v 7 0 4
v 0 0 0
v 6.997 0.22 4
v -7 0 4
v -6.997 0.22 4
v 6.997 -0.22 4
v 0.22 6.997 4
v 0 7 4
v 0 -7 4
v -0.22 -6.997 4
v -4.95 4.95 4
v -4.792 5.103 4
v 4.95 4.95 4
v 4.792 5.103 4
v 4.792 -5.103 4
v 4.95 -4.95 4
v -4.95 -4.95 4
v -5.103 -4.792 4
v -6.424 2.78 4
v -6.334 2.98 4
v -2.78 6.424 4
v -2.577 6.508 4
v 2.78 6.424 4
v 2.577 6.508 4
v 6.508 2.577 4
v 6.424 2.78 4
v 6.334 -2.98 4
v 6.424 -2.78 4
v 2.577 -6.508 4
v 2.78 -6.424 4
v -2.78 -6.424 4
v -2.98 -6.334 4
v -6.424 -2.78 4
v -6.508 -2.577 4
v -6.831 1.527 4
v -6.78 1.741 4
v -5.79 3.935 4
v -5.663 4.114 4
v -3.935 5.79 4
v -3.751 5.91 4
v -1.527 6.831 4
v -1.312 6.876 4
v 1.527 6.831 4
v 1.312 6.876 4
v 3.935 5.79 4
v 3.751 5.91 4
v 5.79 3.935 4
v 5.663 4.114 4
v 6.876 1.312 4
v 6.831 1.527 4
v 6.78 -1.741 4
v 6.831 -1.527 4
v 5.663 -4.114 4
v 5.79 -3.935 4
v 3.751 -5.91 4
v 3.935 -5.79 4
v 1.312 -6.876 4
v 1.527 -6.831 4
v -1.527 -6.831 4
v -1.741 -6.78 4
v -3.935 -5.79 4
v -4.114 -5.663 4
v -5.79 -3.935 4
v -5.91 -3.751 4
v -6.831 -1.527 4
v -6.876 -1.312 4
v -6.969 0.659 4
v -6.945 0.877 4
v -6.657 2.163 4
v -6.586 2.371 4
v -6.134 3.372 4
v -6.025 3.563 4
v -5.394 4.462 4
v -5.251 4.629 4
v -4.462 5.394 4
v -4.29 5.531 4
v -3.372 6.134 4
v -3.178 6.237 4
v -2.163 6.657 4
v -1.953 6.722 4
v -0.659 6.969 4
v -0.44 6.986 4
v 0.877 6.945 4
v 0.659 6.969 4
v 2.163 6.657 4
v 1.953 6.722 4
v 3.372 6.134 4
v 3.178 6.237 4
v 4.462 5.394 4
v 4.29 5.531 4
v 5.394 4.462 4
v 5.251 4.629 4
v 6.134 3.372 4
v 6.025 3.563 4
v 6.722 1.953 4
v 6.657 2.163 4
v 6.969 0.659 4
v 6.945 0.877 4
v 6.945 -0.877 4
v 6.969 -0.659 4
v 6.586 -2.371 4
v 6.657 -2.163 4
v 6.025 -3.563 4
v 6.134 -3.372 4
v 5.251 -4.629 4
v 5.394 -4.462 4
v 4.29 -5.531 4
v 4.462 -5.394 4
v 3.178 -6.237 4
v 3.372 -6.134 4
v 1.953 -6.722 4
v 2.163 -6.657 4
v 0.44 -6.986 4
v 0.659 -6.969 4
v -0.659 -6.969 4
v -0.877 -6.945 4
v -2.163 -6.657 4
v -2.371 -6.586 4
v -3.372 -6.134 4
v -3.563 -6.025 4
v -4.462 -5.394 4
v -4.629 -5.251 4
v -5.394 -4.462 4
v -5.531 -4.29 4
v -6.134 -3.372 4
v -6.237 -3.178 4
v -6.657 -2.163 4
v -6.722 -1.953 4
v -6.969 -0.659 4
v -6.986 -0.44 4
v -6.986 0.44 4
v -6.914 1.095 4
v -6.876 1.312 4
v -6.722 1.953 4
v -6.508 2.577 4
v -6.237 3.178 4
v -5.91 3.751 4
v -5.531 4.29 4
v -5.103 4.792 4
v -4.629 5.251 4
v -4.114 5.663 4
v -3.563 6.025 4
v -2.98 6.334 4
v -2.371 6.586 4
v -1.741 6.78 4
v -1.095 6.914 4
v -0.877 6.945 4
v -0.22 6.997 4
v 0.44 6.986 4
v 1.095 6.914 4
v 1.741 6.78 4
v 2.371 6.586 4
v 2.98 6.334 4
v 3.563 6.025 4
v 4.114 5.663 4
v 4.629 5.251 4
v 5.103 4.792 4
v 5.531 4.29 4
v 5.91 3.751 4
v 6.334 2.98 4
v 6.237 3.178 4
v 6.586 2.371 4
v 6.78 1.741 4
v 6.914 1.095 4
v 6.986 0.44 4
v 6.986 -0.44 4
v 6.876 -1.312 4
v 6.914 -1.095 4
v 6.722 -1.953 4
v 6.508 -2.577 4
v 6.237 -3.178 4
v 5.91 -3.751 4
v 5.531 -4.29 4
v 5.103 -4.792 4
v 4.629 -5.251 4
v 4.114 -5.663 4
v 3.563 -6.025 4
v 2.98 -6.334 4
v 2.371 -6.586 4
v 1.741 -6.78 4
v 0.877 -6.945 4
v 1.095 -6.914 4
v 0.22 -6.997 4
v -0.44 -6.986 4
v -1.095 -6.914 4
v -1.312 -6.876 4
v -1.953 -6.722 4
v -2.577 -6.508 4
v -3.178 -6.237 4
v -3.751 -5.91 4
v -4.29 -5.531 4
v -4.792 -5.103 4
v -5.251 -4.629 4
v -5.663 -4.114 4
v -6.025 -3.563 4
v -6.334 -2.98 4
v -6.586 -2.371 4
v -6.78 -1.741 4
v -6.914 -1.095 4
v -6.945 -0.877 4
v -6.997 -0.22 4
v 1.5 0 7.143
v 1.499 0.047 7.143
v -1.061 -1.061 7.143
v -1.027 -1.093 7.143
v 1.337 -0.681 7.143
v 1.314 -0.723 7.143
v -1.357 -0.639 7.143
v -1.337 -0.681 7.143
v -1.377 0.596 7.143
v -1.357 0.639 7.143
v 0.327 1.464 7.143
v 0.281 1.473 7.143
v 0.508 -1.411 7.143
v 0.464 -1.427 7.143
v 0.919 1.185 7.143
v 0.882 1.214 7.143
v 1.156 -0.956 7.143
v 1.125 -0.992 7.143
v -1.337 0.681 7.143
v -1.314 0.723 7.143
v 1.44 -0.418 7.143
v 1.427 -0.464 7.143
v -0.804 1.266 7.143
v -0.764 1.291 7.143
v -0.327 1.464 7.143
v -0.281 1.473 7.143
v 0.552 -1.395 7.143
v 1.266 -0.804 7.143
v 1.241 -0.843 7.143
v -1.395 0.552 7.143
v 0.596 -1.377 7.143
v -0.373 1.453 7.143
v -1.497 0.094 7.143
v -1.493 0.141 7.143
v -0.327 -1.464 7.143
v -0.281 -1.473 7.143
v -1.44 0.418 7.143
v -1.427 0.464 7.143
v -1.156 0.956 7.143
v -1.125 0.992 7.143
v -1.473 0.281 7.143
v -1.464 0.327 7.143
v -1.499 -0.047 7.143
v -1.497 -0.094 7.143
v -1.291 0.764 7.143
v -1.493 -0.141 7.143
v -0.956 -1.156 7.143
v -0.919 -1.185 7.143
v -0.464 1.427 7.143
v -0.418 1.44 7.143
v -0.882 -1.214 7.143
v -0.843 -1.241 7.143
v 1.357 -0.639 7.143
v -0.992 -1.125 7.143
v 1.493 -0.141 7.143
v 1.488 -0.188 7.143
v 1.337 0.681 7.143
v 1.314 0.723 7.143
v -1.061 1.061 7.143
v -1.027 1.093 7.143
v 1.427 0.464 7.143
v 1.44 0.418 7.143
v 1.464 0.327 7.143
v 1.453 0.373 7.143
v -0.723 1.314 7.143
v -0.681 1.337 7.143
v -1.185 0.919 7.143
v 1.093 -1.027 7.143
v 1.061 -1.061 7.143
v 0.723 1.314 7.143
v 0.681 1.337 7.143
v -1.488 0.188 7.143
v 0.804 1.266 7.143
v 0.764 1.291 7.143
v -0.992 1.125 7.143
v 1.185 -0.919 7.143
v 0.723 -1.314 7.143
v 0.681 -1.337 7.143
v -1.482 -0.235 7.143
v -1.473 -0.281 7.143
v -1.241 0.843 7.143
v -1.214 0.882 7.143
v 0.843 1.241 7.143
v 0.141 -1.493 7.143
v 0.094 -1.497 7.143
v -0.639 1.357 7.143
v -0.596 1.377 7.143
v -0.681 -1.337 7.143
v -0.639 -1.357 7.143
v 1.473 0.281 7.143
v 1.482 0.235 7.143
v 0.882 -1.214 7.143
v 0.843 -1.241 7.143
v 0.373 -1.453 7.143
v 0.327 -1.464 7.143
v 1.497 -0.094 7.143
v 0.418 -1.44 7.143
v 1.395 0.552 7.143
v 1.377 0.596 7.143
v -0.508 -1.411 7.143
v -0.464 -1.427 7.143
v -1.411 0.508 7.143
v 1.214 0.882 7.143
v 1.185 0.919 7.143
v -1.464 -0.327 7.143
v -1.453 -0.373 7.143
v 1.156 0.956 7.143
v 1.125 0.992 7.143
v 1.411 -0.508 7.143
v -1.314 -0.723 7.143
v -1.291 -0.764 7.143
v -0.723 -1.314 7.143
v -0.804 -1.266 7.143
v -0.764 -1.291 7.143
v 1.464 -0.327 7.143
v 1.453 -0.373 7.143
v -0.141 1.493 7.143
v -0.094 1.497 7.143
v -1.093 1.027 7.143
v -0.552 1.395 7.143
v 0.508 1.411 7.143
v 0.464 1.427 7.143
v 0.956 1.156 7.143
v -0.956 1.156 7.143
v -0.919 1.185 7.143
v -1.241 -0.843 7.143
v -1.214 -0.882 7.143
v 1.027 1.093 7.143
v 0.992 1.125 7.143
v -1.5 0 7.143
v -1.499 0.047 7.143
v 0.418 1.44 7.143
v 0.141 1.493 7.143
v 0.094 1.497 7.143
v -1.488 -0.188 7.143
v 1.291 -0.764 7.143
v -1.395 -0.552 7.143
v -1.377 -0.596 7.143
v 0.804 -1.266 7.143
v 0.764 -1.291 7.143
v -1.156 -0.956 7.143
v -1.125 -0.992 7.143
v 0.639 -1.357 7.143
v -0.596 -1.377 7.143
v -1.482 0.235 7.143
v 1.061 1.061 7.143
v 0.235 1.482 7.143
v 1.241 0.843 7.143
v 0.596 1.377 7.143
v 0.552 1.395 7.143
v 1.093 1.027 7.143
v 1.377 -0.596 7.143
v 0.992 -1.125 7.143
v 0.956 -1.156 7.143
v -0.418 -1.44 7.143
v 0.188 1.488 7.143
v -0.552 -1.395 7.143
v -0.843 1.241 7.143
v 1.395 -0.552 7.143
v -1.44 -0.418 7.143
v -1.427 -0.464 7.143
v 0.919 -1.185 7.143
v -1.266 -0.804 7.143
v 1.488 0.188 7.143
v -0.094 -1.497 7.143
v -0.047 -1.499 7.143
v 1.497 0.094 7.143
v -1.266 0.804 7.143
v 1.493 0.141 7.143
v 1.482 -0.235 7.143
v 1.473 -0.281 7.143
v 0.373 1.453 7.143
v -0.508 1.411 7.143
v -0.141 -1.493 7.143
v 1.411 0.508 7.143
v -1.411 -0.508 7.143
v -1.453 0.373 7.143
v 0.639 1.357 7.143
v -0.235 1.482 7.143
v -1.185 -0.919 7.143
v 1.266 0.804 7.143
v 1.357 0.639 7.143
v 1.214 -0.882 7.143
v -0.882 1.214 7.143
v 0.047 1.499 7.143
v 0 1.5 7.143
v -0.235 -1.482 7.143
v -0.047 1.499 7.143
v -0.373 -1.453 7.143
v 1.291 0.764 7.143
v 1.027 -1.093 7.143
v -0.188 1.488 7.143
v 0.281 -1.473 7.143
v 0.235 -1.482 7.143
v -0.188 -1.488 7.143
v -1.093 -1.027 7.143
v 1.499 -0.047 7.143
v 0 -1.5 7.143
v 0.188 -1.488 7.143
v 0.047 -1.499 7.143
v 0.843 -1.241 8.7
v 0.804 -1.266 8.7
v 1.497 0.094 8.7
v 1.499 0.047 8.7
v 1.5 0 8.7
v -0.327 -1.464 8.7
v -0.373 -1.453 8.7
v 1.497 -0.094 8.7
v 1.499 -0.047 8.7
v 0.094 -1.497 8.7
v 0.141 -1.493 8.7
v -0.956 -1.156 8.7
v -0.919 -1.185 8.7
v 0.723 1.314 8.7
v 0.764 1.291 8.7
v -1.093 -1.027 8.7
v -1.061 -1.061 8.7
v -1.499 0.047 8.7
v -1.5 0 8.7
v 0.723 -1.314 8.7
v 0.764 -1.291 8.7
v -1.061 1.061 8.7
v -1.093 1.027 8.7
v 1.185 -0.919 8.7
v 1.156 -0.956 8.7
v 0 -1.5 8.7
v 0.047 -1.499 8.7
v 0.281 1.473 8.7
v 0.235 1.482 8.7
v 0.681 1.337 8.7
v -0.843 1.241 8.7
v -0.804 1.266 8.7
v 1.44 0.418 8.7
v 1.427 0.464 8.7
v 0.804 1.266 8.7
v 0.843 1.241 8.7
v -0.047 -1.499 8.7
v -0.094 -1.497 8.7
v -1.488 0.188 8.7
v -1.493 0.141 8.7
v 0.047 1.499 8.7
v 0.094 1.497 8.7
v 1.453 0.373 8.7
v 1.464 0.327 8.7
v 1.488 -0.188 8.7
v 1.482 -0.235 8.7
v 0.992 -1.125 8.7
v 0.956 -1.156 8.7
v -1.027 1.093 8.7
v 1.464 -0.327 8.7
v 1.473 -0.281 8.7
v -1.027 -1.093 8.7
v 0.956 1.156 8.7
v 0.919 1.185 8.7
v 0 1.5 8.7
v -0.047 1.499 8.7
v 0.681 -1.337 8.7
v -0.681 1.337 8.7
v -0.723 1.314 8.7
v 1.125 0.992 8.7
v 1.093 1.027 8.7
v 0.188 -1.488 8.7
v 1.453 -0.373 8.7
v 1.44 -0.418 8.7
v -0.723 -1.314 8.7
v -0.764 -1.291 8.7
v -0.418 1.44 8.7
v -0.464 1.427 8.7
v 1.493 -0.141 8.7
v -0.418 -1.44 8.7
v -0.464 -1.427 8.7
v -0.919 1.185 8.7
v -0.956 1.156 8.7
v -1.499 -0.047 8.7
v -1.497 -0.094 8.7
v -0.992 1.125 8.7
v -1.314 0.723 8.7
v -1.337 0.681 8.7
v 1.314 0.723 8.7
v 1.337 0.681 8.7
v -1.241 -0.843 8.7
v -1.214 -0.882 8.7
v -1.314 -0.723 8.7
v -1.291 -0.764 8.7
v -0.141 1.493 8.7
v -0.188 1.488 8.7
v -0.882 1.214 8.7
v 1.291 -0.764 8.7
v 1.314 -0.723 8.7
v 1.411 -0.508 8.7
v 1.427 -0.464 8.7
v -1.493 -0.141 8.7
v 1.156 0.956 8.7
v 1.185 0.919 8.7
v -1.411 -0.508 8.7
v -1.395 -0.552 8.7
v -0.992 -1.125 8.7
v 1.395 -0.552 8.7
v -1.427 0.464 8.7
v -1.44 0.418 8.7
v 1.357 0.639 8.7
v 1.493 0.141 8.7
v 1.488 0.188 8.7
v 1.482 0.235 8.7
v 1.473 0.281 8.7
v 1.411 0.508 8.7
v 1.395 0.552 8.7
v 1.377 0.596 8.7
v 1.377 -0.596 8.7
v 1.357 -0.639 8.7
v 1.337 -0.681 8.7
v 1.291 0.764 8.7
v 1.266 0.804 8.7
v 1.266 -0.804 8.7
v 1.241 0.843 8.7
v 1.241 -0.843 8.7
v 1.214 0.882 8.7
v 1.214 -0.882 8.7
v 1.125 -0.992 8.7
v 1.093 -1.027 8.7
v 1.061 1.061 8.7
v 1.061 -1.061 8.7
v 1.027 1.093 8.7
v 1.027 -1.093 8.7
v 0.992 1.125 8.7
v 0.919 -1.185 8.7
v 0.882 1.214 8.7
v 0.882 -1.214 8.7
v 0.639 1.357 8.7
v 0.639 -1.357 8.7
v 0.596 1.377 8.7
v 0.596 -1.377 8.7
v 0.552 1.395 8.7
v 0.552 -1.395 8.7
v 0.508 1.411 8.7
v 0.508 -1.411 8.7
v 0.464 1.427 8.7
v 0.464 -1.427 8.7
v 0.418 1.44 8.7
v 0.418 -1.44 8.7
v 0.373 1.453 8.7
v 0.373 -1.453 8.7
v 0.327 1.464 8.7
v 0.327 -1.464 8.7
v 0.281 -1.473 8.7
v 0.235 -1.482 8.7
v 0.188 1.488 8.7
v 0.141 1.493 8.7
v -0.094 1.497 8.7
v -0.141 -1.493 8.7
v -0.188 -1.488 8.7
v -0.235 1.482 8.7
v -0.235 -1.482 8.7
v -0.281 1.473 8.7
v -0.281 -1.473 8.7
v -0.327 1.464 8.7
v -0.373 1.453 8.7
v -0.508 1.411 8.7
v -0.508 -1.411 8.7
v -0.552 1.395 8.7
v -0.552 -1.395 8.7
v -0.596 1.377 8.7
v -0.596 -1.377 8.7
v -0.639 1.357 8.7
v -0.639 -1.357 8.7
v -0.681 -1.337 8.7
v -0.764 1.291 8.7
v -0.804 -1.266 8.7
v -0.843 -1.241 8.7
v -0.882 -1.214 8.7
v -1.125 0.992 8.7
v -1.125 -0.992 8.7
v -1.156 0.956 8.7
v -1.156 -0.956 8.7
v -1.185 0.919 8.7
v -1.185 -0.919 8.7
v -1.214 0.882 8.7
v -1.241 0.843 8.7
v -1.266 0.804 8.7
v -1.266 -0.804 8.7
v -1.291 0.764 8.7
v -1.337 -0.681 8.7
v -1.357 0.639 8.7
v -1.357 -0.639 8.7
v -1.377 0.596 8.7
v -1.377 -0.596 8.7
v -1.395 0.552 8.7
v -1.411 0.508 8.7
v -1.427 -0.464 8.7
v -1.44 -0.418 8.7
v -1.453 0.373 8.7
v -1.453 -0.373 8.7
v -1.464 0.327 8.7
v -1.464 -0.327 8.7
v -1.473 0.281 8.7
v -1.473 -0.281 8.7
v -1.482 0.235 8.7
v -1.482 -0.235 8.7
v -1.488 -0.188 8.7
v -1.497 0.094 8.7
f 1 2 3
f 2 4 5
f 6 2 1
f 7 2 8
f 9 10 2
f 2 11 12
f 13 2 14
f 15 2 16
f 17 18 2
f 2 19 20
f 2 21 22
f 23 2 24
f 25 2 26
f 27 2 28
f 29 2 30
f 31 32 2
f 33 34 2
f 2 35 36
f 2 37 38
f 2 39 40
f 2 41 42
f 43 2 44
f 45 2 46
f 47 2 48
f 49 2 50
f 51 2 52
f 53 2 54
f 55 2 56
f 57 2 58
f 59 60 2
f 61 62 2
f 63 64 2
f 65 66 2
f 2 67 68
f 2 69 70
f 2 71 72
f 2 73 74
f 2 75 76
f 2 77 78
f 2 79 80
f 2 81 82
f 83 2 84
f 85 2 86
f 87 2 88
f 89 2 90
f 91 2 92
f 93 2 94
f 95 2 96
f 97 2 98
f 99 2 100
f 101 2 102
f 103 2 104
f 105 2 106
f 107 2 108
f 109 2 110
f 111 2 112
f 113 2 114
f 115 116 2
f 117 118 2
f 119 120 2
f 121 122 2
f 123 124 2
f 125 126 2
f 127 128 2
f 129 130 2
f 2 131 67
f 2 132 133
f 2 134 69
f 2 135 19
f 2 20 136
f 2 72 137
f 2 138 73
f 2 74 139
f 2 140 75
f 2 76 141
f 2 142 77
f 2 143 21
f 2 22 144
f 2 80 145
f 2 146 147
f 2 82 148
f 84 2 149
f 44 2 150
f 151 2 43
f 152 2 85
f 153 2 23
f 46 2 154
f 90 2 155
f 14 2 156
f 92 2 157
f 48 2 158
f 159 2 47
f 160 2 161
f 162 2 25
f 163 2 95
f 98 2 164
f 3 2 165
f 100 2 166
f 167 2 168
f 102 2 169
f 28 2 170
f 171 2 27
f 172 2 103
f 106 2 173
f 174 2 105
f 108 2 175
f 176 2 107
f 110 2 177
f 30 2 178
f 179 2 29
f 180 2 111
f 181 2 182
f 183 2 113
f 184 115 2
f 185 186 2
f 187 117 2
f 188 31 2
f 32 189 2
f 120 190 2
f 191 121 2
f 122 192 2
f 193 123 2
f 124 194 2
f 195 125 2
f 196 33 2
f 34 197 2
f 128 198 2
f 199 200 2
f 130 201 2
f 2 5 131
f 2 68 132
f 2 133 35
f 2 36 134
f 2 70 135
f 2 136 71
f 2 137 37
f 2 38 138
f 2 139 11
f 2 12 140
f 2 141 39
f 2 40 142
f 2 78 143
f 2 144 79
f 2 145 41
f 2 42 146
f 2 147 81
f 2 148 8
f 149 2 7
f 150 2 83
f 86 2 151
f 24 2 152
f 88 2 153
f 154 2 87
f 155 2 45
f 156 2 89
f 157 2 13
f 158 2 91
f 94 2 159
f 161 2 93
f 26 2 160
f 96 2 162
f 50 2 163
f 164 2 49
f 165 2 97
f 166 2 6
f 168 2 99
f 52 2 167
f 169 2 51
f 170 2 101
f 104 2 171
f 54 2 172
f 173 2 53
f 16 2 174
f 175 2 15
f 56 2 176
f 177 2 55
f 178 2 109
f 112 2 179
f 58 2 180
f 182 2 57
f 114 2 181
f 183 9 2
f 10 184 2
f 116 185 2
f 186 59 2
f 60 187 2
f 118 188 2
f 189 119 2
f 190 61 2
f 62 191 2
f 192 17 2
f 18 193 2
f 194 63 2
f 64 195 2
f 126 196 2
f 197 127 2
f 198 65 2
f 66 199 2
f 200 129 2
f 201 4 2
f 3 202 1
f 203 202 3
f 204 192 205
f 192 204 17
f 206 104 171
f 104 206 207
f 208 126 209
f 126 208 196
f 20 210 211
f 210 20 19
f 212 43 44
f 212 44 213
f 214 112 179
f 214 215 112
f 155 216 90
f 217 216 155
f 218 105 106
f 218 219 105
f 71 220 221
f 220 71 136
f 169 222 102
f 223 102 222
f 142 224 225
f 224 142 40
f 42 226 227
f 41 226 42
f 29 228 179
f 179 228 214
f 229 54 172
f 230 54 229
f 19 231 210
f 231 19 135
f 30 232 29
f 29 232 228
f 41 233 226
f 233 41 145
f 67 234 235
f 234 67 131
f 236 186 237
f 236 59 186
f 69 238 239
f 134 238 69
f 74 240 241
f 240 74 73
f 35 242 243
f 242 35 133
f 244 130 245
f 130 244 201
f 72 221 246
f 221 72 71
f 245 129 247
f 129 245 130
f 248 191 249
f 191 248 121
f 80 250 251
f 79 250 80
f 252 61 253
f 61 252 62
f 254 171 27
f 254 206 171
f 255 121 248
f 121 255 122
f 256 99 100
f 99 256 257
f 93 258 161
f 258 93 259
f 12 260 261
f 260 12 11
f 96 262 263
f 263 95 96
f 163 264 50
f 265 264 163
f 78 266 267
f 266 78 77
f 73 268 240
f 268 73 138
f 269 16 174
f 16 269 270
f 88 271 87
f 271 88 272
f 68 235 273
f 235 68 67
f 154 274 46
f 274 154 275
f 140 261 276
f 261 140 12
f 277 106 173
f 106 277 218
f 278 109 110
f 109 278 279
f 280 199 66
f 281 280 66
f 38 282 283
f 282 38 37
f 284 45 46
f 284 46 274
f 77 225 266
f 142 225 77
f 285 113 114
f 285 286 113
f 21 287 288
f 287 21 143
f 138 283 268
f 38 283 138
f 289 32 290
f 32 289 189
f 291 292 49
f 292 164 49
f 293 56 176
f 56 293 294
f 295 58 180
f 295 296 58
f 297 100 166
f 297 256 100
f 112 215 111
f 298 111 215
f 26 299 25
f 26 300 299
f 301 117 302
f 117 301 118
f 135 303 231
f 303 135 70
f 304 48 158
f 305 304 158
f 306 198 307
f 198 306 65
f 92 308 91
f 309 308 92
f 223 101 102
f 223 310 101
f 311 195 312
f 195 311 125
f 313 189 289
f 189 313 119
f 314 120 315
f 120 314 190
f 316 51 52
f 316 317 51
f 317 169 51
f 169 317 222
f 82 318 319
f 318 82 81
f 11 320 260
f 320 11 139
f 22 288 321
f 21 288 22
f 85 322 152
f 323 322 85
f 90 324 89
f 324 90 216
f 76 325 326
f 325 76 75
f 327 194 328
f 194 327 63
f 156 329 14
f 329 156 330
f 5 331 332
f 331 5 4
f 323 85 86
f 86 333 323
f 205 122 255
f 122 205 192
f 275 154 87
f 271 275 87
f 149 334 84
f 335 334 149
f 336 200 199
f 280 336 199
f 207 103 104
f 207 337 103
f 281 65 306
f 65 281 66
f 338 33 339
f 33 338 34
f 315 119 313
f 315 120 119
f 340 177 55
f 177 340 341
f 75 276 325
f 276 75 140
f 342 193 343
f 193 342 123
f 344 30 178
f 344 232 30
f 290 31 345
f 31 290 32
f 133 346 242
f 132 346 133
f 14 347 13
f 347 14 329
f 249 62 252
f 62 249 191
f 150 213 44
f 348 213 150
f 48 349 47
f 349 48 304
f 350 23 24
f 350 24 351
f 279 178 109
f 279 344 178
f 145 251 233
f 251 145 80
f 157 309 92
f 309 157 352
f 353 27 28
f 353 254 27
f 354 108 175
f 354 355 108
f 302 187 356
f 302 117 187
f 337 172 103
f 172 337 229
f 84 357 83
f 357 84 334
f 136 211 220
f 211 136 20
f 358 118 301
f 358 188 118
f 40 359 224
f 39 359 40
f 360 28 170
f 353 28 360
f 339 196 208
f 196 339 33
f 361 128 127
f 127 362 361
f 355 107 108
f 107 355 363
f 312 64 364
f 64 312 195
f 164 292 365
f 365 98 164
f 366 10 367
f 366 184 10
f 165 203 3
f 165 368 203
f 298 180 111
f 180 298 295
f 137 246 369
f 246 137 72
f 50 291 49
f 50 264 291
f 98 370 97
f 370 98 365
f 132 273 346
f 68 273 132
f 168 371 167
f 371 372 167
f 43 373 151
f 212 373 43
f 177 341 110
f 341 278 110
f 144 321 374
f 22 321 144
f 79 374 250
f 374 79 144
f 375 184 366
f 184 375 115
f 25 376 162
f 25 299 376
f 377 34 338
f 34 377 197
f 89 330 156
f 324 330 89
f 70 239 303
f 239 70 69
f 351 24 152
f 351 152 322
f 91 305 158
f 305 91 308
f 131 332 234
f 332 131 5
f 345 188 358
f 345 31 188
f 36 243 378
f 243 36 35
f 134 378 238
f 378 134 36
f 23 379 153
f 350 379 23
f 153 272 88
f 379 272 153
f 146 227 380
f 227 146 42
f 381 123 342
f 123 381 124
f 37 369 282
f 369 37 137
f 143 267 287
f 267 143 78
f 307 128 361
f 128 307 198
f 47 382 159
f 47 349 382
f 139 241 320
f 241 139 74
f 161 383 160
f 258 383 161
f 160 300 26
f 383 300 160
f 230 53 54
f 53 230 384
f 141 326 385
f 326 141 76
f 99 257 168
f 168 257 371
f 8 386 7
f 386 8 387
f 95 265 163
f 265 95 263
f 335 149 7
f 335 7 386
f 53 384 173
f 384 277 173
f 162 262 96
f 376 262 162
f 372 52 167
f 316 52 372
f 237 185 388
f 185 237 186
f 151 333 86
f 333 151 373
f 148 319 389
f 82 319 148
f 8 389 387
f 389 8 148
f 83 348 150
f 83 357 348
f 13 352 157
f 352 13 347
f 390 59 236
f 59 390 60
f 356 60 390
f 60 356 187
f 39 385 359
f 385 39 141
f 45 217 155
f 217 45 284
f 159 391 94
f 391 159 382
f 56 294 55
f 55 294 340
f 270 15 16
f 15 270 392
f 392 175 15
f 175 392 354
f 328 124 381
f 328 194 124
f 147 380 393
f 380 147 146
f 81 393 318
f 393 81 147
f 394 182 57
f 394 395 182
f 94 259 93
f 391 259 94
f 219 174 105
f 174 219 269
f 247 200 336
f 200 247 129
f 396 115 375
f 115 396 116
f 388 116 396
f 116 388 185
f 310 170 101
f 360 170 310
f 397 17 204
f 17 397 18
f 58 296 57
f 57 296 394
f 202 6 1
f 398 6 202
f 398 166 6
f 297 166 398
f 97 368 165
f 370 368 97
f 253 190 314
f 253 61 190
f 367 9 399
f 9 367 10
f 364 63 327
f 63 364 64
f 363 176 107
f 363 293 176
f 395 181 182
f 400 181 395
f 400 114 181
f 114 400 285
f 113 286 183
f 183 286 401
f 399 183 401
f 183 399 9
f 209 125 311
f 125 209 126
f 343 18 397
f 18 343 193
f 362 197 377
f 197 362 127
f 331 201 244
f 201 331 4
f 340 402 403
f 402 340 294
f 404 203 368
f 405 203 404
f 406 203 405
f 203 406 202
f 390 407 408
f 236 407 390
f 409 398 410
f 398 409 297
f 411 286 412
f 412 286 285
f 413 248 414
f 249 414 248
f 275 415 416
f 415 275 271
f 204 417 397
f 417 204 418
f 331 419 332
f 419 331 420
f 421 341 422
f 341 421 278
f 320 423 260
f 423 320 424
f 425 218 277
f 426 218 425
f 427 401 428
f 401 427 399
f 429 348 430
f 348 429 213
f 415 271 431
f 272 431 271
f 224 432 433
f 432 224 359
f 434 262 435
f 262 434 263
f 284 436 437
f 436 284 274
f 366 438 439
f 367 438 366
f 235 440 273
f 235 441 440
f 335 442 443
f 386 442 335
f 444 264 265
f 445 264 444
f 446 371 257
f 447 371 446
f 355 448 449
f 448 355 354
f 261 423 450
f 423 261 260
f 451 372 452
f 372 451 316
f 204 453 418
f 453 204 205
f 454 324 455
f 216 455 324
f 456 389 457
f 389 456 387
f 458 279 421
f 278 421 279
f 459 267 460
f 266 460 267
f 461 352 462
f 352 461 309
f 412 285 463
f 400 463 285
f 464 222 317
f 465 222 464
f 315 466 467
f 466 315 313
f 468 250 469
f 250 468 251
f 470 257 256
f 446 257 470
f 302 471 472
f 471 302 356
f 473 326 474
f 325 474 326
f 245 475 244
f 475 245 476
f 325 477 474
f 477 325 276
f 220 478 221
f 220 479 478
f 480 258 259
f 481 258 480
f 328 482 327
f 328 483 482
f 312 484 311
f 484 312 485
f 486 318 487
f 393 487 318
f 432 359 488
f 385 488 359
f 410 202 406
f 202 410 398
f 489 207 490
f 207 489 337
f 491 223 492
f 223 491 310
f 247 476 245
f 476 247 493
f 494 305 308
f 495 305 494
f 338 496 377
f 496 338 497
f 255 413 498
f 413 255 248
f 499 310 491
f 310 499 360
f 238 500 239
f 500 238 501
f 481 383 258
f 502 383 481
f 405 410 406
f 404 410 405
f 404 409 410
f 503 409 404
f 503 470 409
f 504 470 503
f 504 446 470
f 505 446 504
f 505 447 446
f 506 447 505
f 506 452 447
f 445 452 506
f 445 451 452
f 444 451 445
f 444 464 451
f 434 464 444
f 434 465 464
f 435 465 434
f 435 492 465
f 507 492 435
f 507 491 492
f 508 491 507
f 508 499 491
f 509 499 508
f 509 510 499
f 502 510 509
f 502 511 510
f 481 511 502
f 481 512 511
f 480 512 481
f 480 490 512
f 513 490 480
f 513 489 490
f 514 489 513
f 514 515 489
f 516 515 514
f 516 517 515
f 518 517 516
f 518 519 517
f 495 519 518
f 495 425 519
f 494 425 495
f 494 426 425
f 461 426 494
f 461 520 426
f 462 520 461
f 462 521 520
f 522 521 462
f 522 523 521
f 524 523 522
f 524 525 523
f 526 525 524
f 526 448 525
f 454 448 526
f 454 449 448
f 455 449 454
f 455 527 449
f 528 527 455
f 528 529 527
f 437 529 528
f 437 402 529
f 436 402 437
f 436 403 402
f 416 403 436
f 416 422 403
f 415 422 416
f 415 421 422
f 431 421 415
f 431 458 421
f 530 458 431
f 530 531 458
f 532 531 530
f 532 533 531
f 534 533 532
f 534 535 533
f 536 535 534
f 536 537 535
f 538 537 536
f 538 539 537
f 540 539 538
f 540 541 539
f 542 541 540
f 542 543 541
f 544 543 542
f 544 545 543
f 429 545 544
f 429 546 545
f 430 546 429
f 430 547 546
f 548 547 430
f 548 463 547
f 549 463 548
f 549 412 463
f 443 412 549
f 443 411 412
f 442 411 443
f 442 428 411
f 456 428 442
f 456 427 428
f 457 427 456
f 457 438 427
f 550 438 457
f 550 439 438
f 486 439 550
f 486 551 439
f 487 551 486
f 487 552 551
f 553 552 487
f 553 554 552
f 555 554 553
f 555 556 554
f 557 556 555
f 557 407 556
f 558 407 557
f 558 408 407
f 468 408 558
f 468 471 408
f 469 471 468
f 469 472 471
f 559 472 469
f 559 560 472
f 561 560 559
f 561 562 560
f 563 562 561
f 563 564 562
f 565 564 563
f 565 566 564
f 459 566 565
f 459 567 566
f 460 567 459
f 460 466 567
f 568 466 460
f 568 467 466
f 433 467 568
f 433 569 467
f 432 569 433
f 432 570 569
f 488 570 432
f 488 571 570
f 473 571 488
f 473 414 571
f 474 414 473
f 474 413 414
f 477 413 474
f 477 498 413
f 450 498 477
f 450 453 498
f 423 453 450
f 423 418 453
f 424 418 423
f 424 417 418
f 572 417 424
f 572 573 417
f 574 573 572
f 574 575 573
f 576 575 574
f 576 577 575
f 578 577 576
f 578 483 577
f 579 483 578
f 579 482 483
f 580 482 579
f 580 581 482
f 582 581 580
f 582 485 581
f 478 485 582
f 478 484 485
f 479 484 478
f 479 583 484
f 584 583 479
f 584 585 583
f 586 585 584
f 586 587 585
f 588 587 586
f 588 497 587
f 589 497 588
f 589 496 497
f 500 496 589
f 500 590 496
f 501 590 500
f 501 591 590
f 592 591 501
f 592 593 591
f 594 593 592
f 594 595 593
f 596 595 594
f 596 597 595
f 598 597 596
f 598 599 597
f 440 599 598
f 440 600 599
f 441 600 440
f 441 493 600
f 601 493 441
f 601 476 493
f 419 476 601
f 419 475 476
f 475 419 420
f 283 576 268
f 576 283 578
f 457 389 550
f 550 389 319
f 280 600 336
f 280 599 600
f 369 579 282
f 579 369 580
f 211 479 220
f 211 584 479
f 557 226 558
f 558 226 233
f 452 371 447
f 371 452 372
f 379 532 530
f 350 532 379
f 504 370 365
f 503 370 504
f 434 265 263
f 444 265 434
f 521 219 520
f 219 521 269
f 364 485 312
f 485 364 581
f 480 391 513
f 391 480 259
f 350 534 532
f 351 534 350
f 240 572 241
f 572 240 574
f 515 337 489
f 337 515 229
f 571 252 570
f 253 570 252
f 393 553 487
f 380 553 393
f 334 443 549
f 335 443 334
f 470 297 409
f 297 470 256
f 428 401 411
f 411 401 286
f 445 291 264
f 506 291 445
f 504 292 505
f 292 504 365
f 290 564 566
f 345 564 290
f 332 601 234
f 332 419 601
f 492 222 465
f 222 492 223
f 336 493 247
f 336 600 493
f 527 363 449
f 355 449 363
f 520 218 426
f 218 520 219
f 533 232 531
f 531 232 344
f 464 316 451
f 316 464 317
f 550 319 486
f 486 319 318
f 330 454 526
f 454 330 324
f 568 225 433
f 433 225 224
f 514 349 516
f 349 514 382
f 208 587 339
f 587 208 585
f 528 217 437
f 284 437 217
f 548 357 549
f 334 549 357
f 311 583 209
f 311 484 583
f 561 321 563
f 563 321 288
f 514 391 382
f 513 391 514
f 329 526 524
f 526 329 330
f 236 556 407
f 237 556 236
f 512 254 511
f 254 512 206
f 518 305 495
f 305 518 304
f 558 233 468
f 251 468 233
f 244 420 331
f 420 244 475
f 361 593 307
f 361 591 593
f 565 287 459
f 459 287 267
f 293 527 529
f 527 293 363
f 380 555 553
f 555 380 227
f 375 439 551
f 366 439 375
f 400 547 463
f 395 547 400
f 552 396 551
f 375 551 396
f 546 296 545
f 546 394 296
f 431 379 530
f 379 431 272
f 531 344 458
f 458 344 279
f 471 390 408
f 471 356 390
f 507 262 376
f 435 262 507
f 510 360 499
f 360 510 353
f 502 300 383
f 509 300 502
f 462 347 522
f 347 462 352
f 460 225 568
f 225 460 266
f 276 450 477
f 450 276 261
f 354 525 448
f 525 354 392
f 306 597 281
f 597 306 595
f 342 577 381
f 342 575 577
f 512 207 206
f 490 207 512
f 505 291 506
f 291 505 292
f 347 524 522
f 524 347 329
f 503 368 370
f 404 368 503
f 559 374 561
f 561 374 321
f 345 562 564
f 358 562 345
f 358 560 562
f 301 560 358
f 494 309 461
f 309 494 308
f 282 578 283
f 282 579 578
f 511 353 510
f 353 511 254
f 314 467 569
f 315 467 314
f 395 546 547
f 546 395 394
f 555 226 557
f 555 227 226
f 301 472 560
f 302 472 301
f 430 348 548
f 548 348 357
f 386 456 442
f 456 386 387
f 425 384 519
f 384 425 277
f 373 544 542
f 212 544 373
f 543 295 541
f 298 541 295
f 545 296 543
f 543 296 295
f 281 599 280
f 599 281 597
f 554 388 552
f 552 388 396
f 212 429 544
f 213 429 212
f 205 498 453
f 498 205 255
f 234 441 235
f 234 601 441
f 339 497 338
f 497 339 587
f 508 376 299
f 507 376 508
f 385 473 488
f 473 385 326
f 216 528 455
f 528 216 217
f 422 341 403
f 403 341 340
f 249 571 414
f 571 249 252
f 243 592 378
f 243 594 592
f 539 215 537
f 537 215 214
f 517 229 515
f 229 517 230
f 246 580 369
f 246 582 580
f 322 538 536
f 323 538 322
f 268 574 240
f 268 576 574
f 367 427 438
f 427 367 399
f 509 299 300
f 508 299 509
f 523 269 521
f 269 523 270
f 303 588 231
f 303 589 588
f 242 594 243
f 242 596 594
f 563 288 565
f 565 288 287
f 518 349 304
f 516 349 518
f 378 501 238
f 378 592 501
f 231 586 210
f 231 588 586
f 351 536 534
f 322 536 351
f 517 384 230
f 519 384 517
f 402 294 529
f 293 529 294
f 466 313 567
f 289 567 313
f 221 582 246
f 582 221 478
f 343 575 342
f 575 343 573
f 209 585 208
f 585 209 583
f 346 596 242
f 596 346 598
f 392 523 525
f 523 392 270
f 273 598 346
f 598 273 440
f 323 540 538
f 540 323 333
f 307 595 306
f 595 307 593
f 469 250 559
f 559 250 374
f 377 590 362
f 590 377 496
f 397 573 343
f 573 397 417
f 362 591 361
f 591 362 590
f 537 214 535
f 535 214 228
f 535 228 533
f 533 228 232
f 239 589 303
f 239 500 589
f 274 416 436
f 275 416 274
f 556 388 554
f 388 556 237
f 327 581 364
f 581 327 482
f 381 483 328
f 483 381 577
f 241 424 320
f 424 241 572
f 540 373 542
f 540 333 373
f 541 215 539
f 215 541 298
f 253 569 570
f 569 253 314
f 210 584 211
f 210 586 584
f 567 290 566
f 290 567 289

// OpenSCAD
$fn = 200;
midR = 7;
midHeigth = 4;
union (){
cylinder(h= midHeigth, r1 =0,  r2 = midR);
translate ([0,0,midHeigth])
cylinder(h=midHeigth, r1 = midR, r2 = 0);
translate([0,0,midR -.5])
cylinder(h = midHeigth /2 + .2, r1 = 1.5, r2= 1.5);
}
